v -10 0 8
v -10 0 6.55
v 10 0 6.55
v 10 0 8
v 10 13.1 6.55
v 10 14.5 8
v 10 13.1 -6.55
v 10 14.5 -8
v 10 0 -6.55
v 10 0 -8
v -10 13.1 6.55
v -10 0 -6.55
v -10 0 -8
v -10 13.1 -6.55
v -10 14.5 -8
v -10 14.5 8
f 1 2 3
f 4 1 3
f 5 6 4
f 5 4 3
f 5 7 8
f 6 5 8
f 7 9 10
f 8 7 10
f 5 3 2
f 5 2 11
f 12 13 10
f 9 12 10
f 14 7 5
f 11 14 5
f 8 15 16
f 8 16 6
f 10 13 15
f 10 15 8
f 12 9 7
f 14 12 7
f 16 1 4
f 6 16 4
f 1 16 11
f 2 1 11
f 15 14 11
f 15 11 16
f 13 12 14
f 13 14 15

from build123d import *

# Parameters (mm, degrees)
SKETCH1_W           = 20
SKETCH1_H           = 16
BOSS_EXTRUDE1_DEPTH = 14.5
CUT_EXTRUDE1_REACH  = 22
SKETCH2_W           = 13.1
SKETCH2_H           = 13.1


with BuildPart() as part:
    # Sketch1 → Boss-Extrude1 (new body)
    with BuildSketch(Plane(origin=(0, 0, 0), x_dir=(1, 0, 0), z_dir=(0, 1, 0))):
        Rectangle(SKETCH1_W, SKETCH1_H)
    extrude(amount=BOSS_EXTRUDE1_DEPTH)

    # Sketch2 → Cut-Extrude1 (cut, up to next)
    with BuildSketch(Plane.ZY.offset(10), mode=Mode.PRIVATE) as cut_extrude1_sk1:
        with Locations((0, 6.55)):
            Rectangle(SKETCH2_W, SKETCH2_H)
    cut_extrude1_tool1 = extrude(cut_extrude1_sk1.sketch, amount=-CUT_EXTRUDE1_REACH, mode=Mode.PRIVATE) & part.part
    add(cut_extrude1_tool1.solids().sort_by_distance((-10, 6.55, 0))[0], mode=Mode.SUBTRACT)


solid = part.part
